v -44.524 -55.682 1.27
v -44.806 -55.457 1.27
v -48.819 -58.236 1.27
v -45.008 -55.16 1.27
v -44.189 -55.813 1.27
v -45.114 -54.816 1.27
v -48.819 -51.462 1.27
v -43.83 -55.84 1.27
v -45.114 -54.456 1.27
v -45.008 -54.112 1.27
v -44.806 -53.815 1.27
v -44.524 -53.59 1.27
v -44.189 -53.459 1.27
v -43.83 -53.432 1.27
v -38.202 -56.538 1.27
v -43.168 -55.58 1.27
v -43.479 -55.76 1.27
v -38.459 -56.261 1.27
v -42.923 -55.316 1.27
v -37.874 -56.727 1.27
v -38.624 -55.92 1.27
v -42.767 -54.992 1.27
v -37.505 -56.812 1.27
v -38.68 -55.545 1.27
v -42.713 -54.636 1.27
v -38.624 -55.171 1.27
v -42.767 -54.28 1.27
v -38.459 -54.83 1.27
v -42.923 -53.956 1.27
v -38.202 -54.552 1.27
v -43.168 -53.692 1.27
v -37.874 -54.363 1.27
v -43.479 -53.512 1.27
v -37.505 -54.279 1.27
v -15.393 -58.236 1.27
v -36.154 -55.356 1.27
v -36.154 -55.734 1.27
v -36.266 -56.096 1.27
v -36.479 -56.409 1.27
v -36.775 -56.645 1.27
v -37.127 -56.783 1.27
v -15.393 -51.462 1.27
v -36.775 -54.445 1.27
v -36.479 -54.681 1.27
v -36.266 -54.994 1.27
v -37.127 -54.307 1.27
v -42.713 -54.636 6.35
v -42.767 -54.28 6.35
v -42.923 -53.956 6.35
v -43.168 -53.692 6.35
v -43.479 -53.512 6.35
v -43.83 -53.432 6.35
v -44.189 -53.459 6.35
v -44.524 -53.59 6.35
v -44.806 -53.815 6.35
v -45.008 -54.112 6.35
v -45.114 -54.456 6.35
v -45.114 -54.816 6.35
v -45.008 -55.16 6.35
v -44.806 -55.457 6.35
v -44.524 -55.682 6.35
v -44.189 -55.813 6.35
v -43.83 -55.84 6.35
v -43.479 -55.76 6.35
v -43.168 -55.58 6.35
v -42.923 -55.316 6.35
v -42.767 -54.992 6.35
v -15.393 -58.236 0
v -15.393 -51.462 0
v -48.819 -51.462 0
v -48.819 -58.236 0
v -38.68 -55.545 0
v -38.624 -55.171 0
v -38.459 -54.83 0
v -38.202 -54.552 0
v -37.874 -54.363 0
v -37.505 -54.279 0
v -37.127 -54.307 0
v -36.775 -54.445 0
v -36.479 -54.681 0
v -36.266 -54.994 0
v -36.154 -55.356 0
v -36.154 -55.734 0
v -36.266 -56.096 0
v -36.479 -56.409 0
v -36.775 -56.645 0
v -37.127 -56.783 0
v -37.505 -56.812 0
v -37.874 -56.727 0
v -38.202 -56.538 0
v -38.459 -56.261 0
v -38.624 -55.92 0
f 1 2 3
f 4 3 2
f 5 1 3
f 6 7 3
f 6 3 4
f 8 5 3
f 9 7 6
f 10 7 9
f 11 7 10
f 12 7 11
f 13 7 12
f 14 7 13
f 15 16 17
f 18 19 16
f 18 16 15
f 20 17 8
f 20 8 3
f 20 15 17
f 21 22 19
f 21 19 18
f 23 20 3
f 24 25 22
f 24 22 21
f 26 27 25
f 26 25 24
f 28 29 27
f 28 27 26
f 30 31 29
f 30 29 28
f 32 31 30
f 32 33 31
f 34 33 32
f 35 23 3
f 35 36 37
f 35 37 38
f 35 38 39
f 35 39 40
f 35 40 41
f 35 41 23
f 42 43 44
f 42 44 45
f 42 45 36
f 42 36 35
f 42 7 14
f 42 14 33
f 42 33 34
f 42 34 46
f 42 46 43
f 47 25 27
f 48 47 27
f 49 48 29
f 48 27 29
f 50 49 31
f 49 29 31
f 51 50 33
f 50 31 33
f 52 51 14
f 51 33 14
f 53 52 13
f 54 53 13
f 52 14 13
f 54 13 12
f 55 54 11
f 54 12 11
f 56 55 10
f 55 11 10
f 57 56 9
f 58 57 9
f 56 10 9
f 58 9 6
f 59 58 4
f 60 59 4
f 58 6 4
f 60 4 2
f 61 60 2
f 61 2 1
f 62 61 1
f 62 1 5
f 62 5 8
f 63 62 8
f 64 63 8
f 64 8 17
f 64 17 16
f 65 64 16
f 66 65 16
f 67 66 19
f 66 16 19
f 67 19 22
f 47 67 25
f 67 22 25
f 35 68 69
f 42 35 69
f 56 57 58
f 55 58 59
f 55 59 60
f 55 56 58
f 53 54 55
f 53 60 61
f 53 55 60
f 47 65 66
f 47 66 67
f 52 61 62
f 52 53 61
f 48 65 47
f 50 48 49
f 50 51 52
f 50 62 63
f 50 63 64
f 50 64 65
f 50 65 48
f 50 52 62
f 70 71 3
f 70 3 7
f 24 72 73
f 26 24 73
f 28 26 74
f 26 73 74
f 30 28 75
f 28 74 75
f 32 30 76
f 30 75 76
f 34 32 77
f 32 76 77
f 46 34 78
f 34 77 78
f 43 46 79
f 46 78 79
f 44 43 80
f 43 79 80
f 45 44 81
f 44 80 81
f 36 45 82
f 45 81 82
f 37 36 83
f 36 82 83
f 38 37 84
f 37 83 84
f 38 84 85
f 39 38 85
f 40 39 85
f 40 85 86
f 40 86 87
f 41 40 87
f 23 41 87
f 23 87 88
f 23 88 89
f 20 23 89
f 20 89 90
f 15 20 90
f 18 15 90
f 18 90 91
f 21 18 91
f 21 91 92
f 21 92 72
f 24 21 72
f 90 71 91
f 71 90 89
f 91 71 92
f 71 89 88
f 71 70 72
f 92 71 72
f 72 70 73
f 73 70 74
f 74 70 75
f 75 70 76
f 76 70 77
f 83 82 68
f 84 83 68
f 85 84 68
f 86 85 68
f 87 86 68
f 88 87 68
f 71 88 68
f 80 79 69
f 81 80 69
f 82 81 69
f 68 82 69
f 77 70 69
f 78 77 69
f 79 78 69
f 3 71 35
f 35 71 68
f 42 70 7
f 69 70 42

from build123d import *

# Parameters (mm, degrees)
F0_W     = 33.4264
F0_H     = 6.774552
F1_DEPTH = 1.27
F3_D     = 2.54
F4_R     = 1.116582
F5_DEPTH = 5.7658
F7_R     = 1.207406
F8_DEPTH = 5.08


with BuildPart() as f1:
    # F0 (on Top) → F1 (new body)
    with BuildSketch(Plane.XY):
        with Locations((-32.106044, -54.848913)):
            Rectangle(F0_W, F0_H)
    extrude(amount=F1_DEPTH)

    # F3 (through all)
    with Locations(Plane.XY.offset(1.27)):
        with Locations((-37.410062, -55.545177)):
            Hole(F3_D / 2)

    # F7 (on face) → F8 (join)
    with BuildSketch(Plane.XY.offset(1.27)):
        with Locations((-43.920558, -54.636113)):
            Circle(F7_R)
    extrude(amount=F8_DEPTH)


with BuildPart() as f5:
    # F4 (on face) → F5 (new body)
    with BuildSketch(Plane.XY.offset(1.27)):
        with Locations((-37.410062, -55.545177)):
            Circle(F4_R)
    extrude(amount=F5_DEPTH)


solid = f1.part
